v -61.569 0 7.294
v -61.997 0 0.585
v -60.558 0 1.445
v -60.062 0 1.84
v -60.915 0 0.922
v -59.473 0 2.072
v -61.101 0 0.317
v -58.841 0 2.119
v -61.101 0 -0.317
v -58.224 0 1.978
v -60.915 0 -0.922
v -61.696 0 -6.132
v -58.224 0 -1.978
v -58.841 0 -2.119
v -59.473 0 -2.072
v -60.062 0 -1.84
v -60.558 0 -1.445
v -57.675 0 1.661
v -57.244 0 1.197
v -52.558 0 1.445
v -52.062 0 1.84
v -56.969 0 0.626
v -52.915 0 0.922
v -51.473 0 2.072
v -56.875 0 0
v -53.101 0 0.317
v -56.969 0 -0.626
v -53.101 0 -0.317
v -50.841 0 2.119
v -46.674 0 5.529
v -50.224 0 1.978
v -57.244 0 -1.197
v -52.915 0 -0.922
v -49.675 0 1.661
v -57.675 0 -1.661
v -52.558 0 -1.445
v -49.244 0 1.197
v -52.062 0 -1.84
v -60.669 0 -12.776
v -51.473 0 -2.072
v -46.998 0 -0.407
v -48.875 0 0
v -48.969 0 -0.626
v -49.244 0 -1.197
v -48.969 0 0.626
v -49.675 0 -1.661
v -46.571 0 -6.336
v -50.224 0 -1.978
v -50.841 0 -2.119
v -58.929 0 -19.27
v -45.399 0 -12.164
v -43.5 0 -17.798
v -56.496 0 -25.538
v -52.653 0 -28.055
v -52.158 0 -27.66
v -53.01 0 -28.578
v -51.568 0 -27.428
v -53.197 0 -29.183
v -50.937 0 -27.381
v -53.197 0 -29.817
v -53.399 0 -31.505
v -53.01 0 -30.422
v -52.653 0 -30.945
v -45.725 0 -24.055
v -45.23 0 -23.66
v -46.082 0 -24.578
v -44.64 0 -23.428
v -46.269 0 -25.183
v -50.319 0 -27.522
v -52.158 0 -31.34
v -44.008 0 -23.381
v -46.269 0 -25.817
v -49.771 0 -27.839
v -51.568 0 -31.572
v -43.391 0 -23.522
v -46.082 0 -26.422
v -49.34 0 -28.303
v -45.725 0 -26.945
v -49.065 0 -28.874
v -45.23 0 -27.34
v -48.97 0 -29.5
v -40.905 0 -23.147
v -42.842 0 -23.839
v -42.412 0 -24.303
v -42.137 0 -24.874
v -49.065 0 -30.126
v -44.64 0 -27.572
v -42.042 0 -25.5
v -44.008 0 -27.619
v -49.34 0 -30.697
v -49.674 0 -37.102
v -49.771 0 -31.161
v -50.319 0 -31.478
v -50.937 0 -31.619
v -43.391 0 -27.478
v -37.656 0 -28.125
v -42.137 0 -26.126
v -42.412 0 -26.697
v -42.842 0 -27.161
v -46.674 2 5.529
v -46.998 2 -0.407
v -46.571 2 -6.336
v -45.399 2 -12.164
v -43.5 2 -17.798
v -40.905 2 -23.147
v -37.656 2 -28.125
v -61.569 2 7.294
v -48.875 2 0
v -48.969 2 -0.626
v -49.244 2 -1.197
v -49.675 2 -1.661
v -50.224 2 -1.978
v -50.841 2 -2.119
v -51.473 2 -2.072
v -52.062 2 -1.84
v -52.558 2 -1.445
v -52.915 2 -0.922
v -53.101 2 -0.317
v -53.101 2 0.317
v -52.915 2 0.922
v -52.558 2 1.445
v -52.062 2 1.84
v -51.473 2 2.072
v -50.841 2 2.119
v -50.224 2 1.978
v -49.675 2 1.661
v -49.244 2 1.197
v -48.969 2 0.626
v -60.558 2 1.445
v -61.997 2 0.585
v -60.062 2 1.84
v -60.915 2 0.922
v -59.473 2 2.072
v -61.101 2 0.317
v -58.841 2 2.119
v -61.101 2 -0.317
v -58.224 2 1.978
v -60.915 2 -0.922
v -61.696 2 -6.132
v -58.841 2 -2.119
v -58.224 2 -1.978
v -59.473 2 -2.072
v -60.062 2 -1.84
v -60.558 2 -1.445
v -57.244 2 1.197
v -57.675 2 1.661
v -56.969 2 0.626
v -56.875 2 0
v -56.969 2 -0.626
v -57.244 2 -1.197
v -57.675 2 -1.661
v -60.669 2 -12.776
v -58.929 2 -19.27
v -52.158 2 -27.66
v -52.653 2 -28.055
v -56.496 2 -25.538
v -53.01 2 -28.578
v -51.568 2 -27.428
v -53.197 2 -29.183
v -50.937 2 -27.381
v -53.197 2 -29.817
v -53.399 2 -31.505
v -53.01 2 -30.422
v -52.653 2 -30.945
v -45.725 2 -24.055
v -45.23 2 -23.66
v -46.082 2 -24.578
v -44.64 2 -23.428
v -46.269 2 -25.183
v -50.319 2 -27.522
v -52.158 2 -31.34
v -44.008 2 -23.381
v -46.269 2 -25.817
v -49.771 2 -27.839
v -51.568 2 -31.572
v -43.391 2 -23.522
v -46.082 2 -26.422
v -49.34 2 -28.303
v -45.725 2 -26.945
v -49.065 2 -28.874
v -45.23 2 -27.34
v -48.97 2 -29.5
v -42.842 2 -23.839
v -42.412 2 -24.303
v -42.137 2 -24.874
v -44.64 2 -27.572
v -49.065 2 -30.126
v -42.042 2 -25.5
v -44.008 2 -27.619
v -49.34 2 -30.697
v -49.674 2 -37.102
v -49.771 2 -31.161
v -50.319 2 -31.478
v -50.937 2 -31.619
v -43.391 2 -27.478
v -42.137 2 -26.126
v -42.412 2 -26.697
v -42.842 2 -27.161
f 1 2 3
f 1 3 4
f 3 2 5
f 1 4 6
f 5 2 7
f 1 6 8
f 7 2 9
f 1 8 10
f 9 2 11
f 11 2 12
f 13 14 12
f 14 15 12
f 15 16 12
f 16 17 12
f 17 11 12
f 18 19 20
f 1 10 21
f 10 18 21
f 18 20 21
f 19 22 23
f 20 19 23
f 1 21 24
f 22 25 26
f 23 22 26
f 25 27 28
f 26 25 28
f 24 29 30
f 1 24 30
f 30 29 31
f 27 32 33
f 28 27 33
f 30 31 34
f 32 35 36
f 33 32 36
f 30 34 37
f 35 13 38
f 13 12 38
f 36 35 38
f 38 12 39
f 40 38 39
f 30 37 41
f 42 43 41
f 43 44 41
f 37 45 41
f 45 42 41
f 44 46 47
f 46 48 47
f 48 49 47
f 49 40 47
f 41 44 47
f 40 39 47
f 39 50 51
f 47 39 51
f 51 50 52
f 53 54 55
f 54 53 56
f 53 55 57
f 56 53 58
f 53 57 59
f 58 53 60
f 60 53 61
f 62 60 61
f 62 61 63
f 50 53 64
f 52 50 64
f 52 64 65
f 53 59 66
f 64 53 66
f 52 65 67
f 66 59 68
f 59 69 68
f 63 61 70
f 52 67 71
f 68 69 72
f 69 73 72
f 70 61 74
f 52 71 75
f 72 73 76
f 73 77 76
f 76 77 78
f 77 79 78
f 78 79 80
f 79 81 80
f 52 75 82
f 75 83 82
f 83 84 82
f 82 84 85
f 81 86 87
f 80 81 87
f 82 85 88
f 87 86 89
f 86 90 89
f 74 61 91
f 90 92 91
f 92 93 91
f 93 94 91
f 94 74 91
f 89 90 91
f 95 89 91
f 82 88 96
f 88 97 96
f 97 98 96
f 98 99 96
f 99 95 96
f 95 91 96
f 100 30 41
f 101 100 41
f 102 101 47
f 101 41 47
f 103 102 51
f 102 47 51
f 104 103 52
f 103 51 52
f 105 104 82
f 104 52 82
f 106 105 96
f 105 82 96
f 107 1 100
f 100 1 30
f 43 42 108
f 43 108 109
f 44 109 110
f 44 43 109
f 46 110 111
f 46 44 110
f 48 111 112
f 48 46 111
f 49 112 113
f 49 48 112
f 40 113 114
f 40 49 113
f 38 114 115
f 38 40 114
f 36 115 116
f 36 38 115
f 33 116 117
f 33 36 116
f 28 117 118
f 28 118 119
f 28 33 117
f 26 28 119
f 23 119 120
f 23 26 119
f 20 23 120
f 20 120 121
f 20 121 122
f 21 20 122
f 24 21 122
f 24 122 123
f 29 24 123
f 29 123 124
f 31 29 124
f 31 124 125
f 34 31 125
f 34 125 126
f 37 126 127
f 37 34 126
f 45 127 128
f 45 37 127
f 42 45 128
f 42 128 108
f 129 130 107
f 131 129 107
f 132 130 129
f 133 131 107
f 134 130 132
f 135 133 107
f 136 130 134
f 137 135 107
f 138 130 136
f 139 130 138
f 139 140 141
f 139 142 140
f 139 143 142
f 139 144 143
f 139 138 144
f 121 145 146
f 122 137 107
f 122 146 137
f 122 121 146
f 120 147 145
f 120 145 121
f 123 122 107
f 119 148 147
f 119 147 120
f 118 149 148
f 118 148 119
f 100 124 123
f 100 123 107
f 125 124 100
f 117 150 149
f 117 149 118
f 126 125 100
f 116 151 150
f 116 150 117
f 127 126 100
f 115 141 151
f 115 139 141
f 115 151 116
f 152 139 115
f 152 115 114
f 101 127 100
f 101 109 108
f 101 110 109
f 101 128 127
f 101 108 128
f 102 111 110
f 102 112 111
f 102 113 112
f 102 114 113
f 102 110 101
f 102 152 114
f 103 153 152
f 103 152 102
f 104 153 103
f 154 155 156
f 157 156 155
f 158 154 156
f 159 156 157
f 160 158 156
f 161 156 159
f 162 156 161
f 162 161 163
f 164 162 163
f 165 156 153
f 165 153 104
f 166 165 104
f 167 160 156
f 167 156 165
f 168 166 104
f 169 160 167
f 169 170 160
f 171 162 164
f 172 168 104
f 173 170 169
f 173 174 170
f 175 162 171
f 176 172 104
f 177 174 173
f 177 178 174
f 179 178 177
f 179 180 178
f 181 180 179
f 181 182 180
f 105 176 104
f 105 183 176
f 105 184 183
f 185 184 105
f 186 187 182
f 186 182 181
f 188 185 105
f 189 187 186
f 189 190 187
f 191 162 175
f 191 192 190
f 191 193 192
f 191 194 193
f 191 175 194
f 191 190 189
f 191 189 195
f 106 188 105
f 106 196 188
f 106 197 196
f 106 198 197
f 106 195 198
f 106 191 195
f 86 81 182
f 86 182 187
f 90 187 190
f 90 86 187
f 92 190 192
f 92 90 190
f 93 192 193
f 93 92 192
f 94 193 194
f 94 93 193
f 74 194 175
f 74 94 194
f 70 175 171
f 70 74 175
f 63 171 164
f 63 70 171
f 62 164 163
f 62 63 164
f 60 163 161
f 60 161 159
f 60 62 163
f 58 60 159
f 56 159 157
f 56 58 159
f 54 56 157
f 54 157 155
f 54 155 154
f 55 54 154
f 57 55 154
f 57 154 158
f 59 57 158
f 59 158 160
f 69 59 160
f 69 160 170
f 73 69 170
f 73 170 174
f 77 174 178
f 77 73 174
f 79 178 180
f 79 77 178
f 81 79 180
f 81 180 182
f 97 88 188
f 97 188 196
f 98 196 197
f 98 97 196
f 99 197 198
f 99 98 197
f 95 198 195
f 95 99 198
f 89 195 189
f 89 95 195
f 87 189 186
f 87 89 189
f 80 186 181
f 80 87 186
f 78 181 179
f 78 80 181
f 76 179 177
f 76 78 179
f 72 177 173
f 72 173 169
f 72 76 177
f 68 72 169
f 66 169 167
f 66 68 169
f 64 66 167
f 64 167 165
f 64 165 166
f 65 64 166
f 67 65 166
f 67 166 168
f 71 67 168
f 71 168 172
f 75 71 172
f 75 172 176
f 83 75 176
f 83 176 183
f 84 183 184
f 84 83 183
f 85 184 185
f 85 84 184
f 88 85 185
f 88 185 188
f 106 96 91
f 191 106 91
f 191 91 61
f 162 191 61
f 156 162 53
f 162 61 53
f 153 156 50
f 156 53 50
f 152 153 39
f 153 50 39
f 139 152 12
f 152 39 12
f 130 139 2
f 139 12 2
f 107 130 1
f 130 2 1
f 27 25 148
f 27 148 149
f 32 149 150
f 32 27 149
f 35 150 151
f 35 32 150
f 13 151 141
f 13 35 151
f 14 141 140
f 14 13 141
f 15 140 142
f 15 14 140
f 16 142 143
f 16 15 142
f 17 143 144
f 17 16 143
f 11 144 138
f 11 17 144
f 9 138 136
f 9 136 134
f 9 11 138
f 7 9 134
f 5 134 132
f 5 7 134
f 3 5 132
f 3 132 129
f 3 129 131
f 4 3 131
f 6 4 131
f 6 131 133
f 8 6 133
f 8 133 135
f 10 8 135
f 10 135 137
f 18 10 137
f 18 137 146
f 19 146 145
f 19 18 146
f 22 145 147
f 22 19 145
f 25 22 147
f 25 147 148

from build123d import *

# Parameters (mm, degrees)
SKETCH1_R           = 2.125
BOSS_EXTRUDE1_DEPTH = 2


with BuildPart() as part:
    # Sketch1 → Boss-Extrude1 (new body)
    with BuildSketch(Plane(origin=(0, 0, 0), x_dir=(1, 0, 0), z_dir=(0, 1, 0))):
        with BuildLine():
            Line((-37.655823606, 28.125414637), (-49.673639651, 37.101610798))
            ThreePointArc((-49.673639651, 37.101610798), (-59.88740123, 16.046780796), (-61.569439235, -7.294117647))
            Line((-61.569439235, -7.294117647), (-46.673607162, -5.529411765))
            ThreePointArc((-46.673607162, -5.529411765), (-45.398513836, 12.16449512), (-37.655823606, 28.125414637))
        make_face()
        with Locations((-44.167295593, 25.5)):
            Circle(SKETCH1_R, mode=Mode.SUBTRACT)
        with Locations((-51.095498823, 29.5)):
            Circle(SKETCH1_R, mode=Mode.SUBTRACT)
        with Locations((-59, 0)):
            Circle(SKETCH1_R, mode=Mode.SUBTRACT)
        with Locations((-51, 0)):
            Circle(SKETCH1_R, mode=Mode.SUBTRACT)
    extrude(amount=BOSS_EXTRUDE1_DEPTH)


solid = part.part
